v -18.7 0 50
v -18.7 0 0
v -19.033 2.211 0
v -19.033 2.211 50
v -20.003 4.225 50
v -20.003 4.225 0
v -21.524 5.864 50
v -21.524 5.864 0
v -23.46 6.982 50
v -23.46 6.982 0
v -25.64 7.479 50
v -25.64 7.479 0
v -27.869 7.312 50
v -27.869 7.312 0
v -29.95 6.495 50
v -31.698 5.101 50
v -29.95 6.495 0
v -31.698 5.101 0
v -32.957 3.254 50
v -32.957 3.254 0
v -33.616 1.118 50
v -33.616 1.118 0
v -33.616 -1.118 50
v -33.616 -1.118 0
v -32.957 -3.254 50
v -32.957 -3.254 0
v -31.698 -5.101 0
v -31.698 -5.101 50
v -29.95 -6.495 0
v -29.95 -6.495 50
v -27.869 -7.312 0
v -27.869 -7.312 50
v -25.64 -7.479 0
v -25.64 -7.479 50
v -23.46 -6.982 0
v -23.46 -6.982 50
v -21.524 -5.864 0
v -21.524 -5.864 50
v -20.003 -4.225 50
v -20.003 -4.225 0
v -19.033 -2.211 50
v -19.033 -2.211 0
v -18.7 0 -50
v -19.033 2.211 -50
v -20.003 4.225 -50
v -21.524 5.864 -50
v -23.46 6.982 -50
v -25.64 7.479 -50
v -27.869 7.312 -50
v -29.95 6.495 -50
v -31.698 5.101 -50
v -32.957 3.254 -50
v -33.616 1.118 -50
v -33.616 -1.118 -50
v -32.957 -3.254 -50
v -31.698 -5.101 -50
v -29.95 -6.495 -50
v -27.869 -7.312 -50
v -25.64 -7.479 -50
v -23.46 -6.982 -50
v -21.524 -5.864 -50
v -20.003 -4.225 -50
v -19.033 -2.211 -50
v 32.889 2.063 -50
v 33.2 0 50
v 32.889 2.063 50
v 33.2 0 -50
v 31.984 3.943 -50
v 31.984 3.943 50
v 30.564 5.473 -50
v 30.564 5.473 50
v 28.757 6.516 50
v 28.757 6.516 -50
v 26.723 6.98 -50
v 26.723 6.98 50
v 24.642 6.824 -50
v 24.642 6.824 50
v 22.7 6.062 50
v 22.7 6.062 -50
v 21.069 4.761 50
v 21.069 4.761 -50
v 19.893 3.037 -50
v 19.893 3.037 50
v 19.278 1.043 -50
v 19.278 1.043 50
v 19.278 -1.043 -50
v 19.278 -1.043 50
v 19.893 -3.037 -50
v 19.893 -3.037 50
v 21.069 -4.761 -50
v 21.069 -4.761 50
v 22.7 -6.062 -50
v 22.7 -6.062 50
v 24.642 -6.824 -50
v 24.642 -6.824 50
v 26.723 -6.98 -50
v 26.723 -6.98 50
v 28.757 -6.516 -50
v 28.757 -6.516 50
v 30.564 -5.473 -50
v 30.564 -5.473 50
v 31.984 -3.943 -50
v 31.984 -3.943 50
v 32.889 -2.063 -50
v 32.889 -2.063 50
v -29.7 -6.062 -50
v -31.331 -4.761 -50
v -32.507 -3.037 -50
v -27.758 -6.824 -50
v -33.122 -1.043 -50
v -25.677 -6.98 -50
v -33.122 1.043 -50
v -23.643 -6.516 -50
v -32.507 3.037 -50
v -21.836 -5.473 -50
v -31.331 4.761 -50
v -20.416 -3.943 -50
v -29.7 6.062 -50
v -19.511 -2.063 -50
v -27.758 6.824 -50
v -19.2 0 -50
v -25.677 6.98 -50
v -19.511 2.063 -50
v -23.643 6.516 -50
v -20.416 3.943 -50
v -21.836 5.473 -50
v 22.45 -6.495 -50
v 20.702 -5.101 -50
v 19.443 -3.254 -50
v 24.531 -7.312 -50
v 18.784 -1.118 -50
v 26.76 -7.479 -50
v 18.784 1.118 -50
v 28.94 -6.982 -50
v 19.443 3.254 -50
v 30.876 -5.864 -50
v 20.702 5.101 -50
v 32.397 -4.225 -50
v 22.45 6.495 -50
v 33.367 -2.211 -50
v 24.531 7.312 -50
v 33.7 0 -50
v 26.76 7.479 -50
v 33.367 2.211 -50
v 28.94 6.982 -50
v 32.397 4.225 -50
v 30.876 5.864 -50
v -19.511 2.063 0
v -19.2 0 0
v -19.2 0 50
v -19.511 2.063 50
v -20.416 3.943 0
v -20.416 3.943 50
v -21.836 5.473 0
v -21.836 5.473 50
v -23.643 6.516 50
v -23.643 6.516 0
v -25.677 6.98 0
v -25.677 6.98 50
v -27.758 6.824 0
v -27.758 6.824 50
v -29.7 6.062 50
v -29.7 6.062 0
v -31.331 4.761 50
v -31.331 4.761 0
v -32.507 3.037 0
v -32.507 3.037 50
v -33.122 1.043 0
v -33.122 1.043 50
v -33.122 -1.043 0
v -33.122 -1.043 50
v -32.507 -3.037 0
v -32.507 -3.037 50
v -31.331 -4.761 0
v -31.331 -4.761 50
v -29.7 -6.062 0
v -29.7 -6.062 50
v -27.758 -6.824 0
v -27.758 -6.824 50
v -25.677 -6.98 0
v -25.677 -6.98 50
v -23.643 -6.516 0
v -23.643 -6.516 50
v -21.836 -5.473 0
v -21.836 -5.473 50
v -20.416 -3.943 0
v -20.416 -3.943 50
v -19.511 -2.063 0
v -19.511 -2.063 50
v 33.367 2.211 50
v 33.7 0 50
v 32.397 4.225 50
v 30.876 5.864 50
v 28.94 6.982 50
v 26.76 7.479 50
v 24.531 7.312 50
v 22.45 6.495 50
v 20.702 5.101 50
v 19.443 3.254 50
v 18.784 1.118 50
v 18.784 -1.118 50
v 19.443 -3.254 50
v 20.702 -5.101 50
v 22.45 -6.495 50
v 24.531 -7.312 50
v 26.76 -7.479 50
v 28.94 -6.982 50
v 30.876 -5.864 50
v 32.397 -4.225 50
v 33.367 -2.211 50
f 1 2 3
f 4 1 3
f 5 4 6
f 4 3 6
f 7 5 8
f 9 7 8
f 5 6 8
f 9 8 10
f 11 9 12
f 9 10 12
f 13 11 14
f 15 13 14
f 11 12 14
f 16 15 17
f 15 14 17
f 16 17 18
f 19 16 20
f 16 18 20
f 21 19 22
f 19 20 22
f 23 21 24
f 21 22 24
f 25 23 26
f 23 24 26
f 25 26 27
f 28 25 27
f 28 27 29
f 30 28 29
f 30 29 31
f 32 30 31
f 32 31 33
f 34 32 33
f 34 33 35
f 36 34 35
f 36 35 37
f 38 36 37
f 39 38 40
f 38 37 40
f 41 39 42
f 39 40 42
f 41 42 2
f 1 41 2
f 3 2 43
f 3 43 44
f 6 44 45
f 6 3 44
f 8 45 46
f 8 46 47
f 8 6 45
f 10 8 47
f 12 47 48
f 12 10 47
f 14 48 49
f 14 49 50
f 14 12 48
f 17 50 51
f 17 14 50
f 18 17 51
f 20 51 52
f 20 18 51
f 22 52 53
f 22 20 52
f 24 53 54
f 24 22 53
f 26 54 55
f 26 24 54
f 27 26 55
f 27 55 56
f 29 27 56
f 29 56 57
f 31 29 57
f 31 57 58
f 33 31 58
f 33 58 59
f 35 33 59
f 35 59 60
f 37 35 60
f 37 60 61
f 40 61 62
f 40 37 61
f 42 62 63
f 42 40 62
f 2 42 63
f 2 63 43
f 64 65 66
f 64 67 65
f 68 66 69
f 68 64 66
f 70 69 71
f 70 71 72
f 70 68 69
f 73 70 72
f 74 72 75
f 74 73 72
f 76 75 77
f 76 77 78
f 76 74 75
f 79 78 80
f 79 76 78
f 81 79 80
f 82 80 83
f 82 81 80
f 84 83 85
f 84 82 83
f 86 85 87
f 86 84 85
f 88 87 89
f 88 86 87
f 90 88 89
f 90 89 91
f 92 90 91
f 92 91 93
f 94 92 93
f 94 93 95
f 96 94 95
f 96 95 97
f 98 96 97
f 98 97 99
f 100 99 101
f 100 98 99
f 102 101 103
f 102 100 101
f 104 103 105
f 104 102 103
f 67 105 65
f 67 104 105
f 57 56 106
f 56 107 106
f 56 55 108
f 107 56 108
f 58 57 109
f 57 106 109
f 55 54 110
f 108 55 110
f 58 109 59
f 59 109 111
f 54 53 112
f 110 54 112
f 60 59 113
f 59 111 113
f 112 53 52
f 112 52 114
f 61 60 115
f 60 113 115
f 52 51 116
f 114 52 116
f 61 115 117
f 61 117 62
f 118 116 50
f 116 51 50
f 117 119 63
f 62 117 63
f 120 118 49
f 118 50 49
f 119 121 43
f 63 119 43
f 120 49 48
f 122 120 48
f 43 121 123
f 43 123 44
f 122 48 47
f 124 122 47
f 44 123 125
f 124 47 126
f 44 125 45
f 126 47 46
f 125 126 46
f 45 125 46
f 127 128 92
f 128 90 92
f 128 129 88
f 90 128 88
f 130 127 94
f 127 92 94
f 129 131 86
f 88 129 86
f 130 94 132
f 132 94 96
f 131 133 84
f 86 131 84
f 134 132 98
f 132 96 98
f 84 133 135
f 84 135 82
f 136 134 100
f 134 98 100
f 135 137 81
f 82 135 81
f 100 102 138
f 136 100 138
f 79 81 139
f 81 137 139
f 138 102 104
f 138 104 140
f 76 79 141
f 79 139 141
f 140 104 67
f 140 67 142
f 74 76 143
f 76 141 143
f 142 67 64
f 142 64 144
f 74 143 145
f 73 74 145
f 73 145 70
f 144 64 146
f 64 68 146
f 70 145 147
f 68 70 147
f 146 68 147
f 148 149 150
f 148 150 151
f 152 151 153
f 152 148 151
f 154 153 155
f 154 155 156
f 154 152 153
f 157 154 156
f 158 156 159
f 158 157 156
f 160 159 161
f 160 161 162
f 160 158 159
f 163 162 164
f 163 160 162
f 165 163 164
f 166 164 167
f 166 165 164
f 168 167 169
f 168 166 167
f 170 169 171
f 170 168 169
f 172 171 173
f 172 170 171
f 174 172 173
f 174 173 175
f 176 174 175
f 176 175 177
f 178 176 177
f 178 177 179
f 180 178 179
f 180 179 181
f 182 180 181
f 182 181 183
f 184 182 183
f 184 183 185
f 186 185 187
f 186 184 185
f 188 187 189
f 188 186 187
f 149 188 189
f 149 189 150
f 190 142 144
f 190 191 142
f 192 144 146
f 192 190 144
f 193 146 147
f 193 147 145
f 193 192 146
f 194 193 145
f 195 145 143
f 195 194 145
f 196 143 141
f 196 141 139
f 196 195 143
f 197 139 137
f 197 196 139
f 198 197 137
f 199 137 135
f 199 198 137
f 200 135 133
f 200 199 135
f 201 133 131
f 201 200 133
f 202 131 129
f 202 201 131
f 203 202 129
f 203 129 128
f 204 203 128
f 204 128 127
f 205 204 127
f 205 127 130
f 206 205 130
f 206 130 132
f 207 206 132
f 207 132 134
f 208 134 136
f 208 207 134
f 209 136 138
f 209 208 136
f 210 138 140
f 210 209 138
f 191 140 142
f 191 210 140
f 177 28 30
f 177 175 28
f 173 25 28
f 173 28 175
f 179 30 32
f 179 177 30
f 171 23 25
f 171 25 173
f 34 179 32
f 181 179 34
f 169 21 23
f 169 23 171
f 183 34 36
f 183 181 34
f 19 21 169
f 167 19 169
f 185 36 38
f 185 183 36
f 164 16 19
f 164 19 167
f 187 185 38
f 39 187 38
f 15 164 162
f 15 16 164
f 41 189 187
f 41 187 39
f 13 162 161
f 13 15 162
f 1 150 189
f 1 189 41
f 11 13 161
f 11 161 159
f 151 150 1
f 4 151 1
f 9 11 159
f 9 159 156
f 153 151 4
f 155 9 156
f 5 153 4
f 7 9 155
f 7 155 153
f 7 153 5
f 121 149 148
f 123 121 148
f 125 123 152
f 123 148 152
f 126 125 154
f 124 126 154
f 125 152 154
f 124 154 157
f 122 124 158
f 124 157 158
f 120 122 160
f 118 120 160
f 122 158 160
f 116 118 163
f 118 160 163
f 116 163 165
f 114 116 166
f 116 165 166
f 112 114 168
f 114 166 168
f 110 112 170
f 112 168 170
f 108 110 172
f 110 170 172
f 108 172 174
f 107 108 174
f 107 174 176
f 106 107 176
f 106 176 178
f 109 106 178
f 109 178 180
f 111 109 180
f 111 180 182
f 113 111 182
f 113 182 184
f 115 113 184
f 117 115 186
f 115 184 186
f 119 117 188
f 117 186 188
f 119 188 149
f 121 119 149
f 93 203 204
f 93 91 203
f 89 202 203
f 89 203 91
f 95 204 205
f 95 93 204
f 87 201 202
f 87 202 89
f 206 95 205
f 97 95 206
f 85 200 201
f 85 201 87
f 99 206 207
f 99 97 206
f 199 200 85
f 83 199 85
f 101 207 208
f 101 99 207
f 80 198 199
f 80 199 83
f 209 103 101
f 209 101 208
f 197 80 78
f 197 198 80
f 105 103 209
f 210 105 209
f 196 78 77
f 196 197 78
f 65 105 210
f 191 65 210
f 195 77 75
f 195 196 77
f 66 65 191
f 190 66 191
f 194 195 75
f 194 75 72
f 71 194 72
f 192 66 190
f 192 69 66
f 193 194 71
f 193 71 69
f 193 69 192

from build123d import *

# Parameters (mm, degrees)
F0_R     = 7.5
F0_R_2   = 7
F1_DEPTH = 50


with BuildPart() as f1:
    # F0 (on Top) → F1 (new body, symmetric)
    with BuildSketch(Plane.XY):
        with Locations((-26.2, 0)):
            Circle(F0_R)
        with Locations((-26.2, 0)):
            Circle(F0_R_2, mode=Mode.SUBTRACT)
        with Locations((26.2, 0)):
            Circle(F0_R)
        with Locations((26.2, 0)):
            Circle(F0_R_2, mode=Mode.SUBTRACT)
    extrude(amount=F1_DEPTH, both=True)


solid = f1.part
